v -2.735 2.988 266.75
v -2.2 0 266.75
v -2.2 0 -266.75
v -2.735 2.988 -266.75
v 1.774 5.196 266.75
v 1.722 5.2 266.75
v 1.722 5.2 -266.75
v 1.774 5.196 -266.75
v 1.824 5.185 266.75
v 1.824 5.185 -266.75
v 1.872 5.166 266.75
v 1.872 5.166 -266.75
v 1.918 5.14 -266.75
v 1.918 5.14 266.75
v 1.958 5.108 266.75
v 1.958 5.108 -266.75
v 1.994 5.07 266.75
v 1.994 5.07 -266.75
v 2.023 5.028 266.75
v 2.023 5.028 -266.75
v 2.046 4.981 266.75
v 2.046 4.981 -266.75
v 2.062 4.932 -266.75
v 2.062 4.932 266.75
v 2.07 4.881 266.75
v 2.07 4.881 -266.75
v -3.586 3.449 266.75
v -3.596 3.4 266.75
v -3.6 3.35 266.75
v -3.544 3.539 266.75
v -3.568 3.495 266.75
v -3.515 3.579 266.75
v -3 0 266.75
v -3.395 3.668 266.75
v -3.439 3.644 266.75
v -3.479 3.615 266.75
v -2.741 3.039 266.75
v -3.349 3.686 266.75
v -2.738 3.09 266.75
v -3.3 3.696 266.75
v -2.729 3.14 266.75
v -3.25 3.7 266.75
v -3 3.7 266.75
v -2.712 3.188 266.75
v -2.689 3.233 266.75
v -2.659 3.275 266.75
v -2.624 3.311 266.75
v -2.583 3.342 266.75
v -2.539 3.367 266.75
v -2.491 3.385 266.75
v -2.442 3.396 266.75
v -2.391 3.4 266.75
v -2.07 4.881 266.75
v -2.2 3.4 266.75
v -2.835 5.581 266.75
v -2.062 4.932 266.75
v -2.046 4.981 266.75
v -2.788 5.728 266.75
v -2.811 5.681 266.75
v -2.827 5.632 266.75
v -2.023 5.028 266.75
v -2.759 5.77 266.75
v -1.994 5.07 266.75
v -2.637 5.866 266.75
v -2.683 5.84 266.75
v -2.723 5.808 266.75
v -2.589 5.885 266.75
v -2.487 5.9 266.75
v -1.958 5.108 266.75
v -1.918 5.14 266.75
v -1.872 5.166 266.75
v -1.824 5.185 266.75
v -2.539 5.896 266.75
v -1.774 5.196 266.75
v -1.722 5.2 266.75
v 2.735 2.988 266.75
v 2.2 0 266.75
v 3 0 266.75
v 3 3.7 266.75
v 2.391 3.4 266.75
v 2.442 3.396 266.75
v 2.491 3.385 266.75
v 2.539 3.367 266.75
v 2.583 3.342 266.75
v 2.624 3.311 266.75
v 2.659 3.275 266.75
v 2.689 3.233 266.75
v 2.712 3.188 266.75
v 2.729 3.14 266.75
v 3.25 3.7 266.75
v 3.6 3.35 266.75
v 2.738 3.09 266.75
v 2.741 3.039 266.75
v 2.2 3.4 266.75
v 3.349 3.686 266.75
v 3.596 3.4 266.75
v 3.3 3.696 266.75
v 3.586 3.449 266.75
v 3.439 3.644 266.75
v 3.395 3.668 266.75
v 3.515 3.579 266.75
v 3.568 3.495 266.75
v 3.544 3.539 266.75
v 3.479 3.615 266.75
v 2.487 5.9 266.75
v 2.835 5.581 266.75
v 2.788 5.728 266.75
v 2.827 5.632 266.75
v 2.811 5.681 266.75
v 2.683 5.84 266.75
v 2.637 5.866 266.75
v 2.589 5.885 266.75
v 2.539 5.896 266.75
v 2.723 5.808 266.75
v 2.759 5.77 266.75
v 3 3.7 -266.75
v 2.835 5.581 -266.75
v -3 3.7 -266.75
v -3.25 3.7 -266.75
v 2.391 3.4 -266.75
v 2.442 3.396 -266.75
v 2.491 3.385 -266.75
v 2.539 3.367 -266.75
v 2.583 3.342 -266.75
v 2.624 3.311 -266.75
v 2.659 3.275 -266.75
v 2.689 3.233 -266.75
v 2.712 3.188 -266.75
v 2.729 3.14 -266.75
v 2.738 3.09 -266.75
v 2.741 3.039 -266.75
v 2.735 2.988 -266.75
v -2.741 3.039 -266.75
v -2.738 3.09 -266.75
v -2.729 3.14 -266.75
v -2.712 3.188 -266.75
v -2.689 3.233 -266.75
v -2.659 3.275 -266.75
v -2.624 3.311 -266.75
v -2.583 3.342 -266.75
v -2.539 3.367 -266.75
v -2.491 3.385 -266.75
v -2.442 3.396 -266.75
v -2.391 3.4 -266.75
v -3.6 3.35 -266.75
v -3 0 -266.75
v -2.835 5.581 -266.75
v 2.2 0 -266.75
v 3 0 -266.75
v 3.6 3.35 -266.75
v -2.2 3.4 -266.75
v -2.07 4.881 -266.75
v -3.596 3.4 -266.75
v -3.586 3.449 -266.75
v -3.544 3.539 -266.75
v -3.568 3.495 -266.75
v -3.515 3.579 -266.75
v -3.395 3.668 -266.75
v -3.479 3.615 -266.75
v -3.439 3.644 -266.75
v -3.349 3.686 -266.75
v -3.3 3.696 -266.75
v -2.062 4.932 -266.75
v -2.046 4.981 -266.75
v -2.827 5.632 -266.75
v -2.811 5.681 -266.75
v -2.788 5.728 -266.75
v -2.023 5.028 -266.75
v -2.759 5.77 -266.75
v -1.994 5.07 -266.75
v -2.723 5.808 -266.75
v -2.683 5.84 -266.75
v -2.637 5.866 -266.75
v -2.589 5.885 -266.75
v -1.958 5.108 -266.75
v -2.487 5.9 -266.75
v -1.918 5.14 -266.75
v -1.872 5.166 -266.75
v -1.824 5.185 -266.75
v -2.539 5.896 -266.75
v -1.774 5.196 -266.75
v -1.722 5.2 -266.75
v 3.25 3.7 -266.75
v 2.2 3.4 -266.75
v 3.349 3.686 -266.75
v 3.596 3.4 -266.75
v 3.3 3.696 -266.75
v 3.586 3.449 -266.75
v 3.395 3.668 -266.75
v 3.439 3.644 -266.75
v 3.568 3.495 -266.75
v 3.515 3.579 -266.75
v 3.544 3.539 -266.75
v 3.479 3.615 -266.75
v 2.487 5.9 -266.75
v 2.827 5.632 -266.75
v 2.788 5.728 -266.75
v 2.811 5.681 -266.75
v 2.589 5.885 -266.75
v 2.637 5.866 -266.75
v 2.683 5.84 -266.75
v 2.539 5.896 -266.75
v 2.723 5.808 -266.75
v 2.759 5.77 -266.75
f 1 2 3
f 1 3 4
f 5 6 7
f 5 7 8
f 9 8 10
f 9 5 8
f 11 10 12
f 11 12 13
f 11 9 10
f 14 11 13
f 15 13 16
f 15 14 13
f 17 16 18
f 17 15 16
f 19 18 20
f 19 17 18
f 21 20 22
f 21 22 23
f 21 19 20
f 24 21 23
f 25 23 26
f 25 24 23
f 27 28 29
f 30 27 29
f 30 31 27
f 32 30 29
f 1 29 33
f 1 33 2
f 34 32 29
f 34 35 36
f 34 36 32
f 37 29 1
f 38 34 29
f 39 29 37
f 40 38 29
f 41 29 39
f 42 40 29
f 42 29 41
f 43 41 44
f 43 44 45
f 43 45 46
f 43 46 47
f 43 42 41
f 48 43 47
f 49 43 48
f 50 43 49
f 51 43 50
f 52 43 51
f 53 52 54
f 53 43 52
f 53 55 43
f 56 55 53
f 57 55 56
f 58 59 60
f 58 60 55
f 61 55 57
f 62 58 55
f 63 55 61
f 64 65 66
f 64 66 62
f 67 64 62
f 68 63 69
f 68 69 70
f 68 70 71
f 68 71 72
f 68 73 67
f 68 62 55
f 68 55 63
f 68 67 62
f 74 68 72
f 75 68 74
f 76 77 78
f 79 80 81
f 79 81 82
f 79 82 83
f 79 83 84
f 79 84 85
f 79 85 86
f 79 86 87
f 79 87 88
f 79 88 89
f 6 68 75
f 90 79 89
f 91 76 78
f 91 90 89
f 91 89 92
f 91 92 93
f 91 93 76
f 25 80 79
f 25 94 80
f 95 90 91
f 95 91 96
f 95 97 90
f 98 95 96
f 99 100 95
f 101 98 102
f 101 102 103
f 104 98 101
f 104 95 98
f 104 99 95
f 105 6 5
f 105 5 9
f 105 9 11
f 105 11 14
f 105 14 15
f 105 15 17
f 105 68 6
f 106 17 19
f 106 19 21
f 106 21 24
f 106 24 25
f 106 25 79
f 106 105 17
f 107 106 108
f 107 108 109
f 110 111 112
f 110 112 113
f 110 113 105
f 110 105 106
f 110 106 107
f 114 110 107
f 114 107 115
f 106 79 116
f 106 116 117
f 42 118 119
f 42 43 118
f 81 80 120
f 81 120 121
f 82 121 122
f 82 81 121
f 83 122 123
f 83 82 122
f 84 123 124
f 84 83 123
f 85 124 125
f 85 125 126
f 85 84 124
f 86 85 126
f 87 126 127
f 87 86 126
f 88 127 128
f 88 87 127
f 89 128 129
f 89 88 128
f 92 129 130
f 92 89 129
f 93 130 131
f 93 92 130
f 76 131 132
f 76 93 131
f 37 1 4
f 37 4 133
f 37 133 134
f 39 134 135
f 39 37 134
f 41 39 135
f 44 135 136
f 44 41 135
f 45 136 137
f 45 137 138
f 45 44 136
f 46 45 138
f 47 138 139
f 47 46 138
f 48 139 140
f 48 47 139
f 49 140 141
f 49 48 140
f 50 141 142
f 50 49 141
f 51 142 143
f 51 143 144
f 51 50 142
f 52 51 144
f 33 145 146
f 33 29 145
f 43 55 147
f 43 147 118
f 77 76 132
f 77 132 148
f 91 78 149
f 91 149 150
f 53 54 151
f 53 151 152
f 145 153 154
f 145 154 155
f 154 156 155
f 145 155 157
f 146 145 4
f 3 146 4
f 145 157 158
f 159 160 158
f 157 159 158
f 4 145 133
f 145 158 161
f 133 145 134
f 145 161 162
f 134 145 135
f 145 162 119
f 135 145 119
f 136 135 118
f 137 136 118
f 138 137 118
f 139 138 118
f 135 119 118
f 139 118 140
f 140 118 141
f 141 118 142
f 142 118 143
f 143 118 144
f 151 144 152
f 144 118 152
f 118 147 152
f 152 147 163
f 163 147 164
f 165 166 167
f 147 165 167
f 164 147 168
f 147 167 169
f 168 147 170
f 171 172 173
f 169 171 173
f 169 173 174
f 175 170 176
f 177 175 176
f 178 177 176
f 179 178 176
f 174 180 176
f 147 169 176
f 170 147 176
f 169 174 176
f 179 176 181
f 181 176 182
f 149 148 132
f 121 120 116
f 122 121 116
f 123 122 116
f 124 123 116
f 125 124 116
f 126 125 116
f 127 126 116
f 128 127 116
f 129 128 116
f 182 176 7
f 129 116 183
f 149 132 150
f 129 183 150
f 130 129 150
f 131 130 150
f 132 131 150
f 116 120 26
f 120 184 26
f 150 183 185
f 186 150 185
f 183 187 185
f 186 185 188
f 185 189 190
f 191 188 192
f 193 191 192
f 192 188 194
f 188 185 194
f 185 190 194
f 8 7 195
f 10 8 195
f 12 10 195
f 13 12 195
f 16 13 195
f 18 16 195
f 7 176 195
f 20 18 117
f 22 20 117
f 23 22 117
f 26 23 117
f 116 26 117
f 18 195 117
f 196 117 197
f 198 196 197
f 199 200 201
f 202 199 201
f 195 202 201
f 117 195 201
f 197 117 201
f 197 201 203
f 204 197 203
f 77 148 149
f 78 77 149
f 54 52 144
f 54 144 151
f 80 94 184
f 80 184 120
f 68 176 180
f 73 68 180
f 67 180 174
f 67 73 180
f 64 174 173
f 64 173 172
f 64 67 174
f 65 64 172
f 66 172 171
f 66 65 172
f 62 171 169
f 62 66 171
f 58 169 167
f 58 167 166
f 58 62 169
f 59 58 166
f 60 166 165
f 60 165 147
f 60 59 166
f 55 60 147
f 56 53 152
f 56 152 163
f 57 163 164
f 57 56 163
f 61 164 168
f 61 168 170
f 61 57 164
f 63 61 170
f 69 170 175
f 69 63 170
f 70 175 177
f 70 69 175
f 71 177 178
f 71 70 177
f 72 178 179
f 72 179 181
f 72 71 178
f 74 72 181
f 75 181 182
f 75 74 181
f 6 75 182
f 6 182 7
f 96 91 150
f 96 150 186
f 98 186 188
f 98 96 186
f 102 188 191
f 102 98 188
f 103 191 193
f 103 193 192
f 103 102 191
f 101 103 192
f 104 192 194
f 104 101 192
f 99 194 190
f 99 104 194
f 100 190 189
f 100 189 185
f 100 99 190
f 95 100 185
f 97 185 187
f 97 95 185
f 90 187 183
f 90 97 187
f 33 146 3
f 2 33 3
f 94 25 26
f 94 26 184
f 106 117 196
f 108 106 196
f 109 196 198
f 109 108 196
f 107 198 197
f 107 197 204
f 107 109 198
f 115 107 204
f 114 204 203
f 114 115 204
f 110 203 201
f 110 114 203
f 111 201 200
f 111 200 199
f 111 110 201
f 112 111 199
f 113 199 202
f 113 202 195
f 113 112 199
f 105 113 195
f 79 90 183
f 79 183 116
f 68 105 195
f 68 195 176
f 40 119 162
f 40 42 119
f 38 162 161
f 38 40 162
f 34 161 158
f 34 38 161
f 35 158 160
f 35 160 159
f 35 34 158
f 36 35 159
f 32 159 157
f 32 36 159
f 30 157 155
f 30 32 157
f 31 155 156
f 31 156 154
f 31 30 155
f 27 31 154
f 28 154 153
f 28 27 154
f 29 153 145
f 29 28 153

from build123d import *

# Parameters (mm, degrees)
BOSS_EXTRUDE1_DEPTH = 266.75


with BuildPart() as part:
    # Sketch1 → Boss-Extrude1 (new body, symmetric)
    with BuildSketch(Plane.XY):
        with BuildLine():
            Line((-3.6, 3.35), (-3, 0))
            Line((-3, 0), (-2.2, 0))
            Line((-2.2, 0), (-2.735217071, 2.988295315))
            ThreePointArc((-2.735217071, 2.988295315), (-2.659117427, 3.274614514), (-2.390699246, 3.4))
            Line((-2.390699246, 3.4), (-2.2, 3.4))
            Line((-2.2, 3.4), (-2.070472639, 4.88050451))
            ThreePointArc((-2.070472639, 4.88050451), (-1.958261067, 5.108047068), (-1.721804495, 5.2))
            Line((-1.721804495, 5.2), (1.721804495, 5.2))
            ThreePointArc((1.721804495, 5.2), (1.958261067, 5.108047068), (2.070472639, 4.88050451))
            Line((2.070472639, 4.88050451), (2.2, 3.4))
            Line((2.2, 3.4), (2.390699246, 3.4))
            ThreePointArc((2.390699246, 3.4), (2.659117427, 3.274614514), (2.735217071, 2.988295315))
            Line((2.735217071, 2.988295315), (2.2, 0))
            Line((2.2, 0), (3, 0))
            Line((3, 0), (3.6, 3.35))
            ThreePointArc((3.6, 3.35), (3.497487373, 3.597487373), (3.25, 3.7))
            Line((3.25, 3.7), (3, 3.7))
            Line((3, 3.7), (2.835477174, 5.58050451))
            ThreePointArc((2.835477174, 5.58050451), (2.723265602, 5.808047068), (2.486809029, 5.9))
            Line((2.486809029, 5.9), (-2.486809029, 5.9))
            ThreePointArc((-2.486809029, 5.9), (-2.723265602, 5.808047068), (-2.835477174, 5.58050451))
            Line((-2.835477174, 5.58050451), (-3, 3.7))
            Line((-3, 3.7), (-3.25, 3.7))
            ThreePointArc((-3.25, 3.7), (-3.497487373, 3.597487373), (-3.6, 3.35))
        make_face()
    extrude(amount=BOSS_EXTRUDE1_DEPTH, both=True)


solid = part.part
